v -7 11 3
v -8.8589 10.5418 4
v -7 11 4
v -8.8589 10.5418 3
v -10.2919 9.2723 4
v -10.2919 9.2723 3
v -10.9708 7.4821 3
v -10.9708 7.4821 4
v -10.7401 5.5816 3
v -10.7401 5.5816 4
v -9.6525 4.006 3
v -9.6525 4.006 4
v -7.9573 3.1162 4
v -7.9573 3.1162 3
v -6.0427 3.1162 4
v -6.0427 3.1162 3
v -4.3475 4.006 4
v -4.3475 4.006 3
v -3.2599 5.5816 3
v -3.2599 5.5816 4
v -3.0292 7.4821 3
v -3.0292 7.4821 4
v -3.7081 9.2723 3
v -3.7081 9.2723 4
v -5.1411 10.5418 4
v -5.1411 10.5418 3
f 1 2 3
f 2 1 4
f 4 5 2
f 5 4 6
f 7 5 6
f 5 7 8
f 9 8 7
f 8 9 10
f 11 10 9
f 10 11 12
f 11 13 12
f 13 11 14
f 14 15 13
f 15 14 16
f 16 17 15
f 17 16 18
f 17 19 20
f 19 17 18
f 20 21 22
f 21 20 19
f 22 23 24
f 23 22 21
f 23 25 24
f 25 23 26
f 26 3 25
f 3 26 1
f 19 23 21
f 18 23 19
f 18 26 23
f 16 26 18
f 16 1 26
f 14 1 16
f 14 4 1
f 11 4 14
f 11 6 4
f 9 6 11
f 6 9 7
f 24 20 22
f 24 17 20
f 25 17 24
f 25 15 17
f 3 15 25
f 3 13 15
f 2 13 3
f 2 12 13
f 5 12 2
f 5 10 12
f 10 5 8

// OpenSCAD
module xyzCube(c, x, y, z)
{
    color(c) cube([x, y, z], false);
}

module transCube(c, xOffset, yOffset, zOffset, x, y, z)
{
    translate([xOffset, yOffset, zOffset]) xyzCube(c, x, y, z);
}

module rotCube(c, rotX, rotY, rotZ, xO, yO, zO, x, y, z)
{
    rotate([rotX, rotY, rotZ]) transCube(c, xO, yO, zO, x, y, z);
}
//rotCube("yellow", 0,0,0, 0,0,0, 2, 3, 4);
//rotCube("green", 10, 20, 30, 4, 3, 1, 5, 6, 7);


module rhCentCylinder(c, rRadius, z)
{
    color(c) cylinder(h=z, r=rRadius, false);
}
//rhCentCylinder("red", 3, 2);

module rhCylinder(c, rRadius, z)
{
    translate([rRadius, rRadius, 0]) rhCentCylinder(c, rRadius, z);
}
//rhCylinder("red", 3, 2);

module transCylinder(c, xO, yO, zO, rRadius, z)
{
    translate([xO, yO, zO]) rhCylinder(c, rRadius, z);
}
//transCylinder("green", -10, 10, 4, 3, 2);

module rotCylinder(c, rotZ, xO, yO, zO, rRadius, z)
{
    rotate([0, 0, rotZ]) transCylinder(c, xO, yO, zO, rRadius, z);
}
rotCylinder("orange", 90, 3, 3, 3, 4, 5);
